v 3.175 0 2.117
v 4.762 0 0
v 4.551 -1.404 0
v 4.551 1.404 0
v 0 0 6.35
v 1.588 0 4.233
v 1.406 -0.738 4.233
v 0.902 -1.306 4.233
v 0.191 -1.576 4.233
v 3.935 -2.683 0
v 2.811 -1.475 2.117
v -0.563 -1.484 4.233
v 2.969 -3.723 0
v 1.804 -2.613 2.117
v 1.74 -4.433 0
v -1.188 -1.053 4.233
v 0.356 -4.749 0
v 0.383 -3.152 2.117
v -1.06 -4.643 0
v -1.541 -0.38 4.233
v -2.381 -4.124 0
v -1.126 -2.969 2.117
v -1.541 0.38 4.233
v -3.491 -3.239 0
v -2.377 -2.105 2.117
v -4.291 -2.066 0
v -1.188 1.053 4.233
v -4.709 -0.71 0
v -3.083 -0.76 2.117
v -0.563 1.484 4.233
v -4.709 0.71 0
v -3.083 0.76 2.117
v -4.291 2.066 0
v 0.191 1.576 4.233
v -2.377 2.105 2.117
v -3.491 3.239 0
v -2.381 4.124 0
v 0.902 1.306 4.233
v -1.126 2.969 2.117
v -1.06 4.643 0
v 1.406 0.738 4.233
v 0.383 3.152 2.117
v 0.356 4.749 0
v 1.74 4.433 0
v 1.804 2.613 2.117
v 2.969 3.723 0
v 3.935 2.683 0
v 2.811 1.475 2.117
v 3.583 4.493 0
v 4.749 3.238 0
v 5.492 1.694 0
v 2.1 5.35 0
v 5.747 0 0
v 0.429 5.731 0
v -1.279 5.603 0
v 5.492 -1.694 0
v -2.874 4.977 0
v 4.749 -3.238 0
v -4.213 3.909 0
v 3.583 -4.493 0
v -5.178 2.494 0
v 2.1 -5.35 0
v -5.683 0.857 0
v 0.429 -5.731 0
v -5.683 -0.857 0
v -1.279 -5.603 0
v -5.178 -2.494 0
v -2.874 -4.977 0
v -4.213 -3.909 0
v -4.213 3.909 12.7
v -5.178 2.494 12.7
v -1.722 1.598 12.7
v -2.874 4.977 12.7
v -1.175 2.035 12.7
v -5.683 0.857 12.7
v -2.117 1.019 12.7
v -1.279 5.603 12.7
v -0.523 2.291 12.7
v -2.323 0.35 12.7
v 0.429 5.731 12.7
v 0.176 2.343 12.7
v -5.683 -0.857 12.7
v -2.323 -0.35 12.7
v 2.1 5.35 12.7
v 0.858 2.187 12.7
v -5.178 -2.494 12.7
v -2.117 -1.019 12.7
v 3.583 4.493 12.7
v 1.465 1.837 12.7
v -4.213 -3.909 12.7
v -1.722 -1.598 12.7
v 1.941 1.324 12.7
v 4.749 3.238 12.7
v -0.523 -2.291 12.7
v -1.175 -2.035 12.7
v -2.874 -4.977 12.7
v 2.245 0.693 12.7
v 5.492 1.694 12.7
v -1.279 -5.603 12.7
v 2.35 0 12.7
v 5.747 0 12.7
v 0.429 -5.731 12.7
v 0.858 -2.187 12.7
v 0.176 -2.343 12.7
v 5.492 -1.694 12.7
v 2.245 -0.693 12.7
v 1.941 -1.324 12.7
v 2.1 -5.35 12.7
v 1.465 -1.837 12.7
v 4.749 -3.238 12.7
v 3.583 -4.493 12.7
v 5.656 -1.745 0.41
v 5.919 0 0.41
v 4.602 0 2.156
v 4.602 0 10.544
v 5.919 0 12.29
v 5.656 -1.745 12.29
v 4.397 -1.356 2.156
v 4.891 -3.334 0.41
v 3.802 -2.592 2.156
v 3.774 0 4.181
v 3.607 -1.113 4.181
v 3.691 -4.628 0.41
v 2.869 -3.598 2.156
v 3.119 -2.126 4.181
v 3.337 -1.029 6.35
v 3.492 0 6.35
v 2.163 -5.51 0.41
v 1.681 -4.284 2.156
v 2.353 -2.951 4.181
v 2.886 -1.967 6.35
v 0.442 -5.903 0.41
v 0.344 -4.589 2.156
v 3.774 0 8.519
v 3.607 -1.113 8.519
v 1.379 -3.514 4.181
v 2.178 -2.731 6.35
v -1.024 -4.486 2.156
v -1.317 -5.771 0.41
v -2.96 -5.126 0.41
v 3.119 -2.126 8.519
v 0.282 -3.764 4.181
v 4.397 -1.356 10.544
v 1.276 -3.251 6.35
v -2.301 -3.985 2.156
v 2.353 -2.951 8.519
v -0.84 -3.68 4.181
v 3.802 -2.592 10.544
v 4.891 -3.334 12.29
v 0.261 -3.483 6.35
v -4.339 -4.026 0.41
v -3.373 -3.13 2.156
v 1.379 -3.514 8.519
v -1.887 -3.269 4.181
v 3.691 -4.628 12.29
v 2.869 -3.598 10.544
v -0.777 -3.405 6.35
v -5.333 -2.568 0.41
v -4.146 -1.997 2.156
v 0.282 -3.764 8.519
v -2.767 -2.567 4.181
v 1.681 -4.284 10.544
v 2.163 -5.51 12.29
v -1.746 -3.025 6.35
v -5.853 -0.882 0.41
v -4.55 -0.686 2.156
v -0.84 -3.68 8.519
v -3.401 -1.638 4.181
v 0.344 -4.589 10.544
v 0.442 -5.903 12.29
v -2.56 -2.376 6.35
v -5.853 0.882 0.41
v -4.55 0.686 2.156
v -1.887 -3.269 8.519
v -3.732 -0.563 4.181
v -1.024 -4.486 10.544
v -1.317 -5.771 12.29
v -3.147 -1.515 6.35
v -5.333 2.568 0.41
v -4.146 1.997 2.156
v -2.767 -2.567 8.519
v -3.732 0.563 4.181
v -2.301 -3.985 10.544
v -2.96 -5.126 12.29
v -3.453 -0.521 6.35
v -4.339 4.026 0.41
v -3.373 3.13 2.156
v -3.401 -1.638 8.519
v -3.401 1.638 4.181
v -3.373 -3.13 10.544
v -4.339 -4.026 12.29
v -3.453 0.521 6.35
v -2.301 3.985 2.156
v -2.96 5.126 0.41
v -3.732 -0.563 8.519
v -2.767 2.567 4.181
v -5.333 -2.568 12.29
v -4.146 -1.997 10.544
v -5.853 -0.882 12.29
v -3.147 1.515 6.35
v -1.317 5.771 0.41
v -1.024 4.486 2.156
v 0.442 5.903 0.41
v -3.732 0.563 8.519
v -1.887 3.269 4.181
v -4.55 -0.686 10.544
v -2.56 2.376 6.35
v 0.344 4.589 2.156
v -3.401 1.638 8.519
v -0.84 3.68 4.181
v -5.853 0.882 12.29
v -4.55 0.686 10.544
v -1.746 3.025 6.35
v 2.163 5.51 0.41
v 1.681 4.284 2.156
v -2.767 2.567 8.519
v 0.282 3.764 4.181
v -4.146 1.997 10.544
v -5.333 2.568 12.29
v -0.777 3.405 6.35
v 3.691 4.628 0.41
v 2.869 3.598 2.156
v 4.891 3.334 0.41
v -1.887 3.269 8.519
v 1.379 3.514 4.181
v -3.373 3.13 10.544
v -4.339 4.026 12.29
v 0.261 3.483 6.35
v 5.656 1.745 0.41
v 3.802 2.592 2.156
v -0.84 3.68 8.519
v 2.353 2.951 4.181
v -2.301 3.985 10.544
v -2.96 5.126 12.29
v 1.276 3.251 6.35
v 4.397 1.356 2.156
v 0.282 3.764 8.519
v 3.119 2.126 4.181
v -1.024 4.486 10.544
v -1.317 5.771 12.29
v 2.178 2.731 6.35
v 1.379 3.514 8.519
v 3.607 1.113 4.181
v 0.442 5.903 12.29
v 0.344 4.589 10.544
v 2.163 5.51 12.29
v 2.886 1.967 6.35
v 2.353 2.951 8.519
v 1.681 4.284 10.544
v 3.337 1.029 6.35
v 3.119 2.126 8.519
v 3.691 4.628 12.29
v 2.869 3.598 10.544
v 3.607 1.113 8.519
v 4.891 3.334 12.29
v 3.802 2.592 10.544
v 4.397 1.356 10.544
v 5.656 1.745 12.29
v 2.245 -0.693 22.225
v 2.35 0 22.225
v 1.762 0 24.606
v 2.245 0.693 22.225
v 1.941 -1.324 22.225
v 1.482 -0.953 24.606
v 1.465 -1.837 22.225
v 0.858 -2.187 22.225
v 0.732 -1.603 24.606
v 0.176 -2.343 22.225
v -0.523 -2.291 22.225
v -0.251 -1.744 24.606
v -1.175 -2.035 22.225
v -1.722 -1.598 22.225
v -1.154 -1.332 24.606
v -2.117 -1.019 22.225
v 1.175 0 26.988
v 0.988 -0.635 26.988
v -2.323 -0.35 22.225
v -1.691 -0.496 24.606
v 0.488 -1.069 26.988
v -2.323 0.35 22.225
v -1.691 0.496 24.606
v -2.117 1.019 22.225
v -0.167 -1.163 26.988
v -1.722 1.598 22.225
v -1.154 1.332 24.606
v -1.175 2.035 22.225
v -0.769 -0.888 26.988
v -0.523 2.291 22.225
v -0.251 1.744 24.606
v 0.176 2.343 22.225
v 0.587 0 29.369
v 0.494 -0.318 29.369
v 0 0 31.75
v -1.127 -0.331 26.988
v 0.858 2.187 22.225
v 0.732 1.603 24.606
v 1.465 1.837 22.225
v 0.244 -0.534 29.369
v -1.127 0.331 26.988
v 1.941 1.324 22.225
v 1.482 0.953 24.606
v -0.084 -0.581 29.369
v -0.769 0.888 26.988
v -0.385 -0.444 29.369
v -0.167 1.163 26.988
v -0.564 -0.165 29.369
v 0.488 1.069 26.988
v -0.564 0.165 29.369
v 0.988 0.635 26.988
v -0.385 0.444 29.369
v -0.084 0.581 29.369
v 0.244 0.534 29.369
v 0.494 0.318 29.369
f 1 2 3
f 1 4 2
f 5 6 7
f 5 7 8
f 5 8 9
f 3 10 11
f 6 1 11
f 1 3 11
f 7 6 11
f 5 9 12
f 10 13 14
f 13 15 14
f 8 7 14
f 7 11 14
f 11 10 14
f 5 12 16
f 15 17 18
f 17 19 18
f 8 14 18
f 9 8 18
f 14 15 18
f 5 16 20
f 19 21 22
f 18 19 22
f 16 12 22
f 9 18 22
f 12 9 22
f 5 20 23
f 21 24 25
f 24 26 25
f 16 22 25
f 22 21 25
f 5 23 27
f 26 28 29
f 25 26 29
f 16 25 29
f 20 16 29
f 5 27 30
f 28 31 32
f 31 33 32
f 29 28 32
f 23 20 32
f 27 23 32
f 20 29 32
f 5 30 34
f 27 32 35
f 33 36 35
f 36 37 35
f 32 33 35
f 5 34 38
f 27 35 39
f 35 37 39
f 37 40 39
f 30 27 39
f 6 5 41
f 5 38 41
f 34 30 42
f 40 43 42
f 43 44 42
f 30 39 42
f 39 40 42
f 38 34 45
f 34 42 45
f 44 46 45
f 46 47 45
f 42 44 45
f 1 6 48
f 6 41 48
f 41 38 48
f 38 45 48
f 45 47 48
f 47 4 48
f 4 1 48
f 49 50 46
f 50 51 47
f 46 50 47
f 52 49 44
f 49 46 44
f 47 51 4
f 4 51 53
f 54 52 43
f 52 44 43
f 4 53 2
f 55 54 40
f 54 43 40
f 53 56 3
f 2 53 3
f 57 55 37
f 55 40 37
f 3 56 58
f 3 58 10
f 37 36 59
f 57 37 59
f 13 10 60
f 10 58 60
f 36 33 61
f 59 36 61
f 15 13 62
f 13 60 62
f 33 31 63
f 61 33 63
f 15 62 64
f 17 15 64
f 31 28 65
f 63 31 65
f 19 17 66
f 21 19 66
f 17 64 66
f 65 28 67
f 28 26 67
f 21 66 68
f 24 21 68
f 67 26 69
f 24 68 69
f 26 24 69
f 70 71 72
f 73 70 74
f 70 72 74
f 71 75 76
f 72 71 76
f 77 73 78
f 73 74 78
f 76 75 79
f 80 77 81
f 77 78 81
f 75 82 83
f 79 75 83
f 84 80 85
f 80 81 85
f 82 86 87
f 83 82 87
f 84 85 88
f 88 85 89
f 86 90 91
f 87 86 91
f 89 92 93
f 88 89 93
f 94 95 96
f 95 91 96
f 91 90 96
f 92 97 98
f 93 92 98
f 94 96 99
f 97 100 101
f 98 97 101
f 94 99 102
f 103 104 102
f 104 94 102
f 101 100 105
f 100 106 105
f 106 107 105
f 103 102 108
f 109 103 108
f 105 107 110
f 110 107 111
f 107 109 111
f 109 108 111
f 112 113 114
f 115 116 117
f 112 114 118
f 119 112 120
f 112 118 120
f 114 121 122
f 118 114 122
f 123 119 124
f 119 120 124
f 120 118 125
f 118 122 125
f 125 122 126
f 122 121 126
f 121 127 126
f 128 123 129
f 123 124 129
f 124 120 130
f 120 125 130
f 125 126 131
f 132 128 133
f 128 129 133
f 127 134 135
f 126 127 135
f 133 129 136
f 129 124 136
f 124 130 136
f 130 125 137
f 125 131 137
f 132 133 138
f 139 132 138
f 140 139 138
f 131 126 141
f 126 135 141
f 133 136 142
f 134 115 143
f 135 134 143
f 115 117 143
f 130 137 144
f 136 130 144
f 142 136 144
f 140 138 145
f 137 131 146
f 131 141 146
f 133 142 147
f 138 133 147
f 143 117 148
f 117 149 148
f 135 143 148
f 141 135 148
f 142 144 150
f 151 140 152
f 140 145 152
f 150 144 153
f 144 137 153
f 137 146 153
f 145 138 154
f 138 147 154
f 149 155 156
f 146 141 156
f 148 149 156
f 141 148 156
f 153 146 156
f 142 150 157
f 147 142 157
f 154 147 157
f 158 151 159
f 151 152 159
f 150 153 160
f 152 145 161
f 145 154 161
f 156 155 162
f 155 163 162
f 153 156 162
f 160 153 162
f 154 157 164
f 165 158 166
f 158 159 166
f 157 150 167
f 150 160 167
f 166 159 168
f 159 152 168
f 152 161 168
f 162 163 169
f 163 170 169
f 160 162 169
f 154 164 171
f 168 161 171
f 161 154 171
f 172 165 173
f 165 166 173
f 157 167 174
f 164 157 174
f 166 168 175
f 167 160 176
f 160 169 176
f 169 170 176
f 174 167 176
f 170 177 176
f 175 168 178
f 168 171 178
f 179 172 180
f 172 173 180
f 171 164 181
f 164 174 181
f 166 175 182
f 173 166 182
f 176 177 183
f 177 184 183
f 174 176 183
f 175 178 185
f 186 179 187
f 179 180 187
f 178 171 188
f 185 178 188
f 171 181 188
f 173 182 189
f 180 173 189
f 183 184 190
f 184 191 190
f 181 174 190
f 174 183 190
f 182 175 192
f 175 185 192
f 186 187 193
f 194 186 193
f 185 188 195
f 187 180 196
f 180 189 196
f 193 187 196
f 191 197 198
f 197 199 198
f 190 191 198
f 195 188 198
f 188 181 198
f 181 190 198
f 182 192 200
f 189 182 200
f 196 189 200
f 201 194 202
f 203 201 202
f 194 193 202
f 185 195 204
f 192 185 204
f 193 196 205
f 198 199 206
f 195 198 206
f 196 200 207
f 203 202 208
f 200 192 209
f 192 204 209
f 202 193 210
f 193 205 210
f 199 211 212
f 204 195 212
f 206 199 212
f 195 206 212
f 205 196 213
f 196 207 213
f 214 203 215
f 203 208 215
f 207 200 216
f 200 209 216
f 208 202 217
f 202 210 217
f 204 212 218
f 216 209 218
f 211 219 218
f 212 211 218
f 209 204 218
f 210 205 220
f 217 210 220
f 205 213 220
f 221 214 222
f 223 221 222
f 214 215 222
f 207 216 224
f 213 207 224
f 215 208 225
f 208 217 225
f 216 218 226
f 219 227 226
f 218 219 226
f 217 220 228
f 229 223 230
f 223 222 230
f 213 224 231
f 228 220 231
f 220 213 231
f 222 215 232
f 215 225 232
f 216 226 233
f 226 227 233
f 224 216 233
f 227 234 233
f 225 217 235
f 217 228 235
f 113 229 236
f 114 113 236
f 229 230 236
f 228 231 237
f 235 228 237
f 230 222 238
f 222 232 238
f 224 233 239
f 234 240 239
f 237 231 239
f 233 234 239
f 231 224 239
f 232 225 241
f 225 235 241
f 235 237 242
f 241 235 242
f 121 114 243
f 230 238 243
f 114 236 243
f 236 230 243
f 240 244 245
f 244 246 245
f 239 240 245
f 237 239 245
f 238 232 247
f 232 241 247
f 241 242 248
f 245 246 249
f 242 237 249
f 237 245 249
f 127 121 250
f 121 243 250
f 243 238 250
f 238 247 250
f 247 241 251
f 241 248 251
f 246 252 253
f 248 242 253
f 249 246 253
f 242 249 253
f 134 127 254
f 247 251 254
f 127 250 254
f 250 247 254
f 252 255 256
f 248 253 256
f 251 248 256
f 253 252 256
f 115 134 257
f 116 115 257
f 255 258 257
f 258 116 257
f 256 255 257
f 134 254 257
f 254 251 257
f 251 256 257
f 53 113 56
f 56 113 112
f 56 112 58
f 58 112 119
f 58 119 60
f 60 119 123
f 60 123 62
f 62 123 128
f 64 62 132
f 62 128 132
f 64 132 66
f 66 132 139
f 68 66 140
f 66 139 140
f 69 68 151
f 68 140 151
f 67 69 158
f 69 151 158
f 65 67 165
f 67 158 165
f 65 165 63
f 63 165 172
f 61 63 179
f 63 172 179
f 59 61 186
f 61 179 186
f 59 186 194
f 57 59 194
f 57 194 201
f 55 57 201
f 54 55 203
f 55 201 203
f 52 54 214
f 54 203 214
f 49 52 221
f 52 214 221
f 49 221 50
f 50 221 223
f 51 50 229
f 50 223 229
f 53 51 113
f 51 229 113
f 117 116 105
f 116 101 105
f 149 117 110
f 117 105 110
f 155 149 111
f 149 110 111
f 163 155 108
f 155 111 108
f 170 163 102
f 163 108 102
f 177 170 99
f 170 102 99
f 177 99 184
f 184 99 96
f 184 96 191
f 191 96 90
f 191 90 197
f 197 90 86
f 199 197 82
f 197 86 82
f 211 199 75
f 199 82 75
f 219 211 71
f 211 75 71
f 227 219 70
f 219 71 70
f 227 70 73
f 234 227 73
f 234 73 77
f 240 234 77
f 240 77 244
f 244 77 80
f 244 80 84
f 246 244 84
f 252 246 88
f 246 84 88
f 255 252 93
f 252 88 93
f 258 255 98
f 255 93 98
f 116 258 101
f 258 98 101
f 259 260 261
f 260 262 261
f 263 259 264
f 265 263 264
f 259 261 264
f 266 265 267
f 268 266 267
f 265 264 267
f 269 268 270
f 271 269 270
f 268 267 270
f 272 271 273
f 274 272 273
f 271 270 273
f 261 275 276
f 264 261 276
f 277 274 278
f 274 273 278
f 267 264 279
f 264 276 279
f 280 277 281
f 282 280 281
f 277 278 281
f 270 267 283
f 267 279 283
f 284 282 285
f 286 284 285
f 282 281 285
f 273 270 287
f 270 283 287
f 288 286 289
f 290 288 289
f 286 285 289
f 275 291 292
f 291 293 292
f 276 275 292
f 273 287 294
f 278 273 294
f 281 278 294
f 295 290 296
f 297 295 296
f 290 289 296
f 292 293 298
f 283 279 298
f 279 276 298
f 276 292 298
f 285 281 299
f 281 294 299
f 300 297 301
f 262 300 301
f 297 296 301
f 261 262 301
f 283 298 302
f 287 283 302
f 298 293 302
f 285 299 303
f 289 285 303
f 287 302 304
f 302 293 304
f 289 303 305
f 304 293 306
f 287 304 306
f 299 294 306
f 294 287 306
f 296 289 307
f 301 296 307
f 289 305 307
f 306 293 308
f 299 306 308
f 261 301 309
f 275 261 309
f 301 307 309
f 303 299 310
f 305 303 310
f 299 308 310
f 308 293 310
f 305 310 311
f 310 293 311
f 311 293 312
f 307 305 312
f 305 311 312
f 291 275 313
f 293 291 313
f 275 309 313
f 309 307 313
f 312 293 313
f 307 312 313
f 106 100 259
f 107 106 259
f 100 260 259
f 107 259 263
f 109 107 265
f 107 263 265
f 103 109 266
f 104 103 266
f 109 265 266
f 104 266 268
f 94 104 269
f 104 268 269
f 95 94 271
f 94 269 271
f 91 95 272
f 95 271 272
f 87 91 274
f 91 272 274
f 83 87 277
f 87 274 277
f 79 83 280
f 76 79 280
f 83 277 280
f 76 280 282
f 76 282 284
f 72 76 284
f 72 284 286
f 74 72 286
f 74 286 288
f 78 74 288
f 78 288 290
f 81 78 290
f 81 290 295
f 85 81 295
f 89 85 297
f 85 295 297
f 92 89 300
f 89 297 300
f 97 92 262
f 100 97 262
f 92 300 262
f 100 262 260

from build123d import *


# Not quite as in the source:
# - a fillet or chamfer that OpenCascade refuses, or shapes differently, is made with other operations: its cross-section is extruded or revolved along the edge and cut away or added


with BuildPart() as f1:
    # F0 (on Front) → F1 (revolve)
    with BuildSketch(Plane.XZ):
        with BuildLine():
            Line((0, 31.75), (0, 6.35))
            Line((0, 6.35), (4.7625, 0))
            Line((4.7625, 0), (6.35, 0))
            ThreePointArc((6.35, 0), (3.4925, 6.35), (6.35, 12.7))
            Line((6.35, 12.7), (2.3495, 12.7))
            Line((2.3495, 12.7), (2.3495, 22.225))
            Line((2.3495, 22.225), (0, 31.75))
        make_face()
    revolve(axis=Axis((0, 0, 19.05), (0, 0, -1)))

    # F2: chamfer of 0.635 on 2 edges, made by hand

    # F2_s1 → F2_t2 (revolve, cut)
    with BuildSketch(Plane.XZ):
        with BuildLine():
            Line((5.929083675, 12.2670736629), (5.7374458679, 12.7234188432))
            Line((5.7374458679, 12.7234188432), (5.7374458679, 12.7361188432))
            ThreePointArc((5.7374458679, 12.7361188432), (6.043722934, 12.7127), (6.35, 12.7127))
            Line((6.35, 12.7127), (6.3584226611, 12.6904948025))
            ThreePointArc((6.3584226611, 12.6904948025), (6.1365228233, 12.4867090771), (5.9381511191, 12.2581814496))
            Line((5.9381511191, 12.2581814496), (5.929083675, 12.2670736629))
        make_face()
    revolve(axis=Axis((0, 0, 12.7), (0, 0, -1)), mode=Mode.SUBTRACT)

    # F2_s3 → F2_t4 (revolve, cut)
    with BuildSketch(Plane.XZ):
        with BuildLine():
            Line((5.7374458679, -0.0234188432), (5.929083675, 0.4329263371))
            Line((5.929083675, 0.4329263371), (5.9381511191, 0.4418185504))
            ThreePointArc((5.9381511191, 0.4418185504), (6.1365228233, 0.2132909229), (6.3584226611, 0.0095051975))
            Line((6.3584226611, 0.0095051975), (6.35, -0.0127))
            ThreePointArc((6.35, -0.0127), (6.043722934, -0.0127), (5.7374458679, -0.0361188432))
            Line((5.7374458679, -0.0361188432), (5.7374458679, -0.0234188432))
        make_face()
    revolve(axis=Axis((0, 0, 0), (0, 0, -1)), mode=Mode.SUBTRACT)


solid = f1.part
